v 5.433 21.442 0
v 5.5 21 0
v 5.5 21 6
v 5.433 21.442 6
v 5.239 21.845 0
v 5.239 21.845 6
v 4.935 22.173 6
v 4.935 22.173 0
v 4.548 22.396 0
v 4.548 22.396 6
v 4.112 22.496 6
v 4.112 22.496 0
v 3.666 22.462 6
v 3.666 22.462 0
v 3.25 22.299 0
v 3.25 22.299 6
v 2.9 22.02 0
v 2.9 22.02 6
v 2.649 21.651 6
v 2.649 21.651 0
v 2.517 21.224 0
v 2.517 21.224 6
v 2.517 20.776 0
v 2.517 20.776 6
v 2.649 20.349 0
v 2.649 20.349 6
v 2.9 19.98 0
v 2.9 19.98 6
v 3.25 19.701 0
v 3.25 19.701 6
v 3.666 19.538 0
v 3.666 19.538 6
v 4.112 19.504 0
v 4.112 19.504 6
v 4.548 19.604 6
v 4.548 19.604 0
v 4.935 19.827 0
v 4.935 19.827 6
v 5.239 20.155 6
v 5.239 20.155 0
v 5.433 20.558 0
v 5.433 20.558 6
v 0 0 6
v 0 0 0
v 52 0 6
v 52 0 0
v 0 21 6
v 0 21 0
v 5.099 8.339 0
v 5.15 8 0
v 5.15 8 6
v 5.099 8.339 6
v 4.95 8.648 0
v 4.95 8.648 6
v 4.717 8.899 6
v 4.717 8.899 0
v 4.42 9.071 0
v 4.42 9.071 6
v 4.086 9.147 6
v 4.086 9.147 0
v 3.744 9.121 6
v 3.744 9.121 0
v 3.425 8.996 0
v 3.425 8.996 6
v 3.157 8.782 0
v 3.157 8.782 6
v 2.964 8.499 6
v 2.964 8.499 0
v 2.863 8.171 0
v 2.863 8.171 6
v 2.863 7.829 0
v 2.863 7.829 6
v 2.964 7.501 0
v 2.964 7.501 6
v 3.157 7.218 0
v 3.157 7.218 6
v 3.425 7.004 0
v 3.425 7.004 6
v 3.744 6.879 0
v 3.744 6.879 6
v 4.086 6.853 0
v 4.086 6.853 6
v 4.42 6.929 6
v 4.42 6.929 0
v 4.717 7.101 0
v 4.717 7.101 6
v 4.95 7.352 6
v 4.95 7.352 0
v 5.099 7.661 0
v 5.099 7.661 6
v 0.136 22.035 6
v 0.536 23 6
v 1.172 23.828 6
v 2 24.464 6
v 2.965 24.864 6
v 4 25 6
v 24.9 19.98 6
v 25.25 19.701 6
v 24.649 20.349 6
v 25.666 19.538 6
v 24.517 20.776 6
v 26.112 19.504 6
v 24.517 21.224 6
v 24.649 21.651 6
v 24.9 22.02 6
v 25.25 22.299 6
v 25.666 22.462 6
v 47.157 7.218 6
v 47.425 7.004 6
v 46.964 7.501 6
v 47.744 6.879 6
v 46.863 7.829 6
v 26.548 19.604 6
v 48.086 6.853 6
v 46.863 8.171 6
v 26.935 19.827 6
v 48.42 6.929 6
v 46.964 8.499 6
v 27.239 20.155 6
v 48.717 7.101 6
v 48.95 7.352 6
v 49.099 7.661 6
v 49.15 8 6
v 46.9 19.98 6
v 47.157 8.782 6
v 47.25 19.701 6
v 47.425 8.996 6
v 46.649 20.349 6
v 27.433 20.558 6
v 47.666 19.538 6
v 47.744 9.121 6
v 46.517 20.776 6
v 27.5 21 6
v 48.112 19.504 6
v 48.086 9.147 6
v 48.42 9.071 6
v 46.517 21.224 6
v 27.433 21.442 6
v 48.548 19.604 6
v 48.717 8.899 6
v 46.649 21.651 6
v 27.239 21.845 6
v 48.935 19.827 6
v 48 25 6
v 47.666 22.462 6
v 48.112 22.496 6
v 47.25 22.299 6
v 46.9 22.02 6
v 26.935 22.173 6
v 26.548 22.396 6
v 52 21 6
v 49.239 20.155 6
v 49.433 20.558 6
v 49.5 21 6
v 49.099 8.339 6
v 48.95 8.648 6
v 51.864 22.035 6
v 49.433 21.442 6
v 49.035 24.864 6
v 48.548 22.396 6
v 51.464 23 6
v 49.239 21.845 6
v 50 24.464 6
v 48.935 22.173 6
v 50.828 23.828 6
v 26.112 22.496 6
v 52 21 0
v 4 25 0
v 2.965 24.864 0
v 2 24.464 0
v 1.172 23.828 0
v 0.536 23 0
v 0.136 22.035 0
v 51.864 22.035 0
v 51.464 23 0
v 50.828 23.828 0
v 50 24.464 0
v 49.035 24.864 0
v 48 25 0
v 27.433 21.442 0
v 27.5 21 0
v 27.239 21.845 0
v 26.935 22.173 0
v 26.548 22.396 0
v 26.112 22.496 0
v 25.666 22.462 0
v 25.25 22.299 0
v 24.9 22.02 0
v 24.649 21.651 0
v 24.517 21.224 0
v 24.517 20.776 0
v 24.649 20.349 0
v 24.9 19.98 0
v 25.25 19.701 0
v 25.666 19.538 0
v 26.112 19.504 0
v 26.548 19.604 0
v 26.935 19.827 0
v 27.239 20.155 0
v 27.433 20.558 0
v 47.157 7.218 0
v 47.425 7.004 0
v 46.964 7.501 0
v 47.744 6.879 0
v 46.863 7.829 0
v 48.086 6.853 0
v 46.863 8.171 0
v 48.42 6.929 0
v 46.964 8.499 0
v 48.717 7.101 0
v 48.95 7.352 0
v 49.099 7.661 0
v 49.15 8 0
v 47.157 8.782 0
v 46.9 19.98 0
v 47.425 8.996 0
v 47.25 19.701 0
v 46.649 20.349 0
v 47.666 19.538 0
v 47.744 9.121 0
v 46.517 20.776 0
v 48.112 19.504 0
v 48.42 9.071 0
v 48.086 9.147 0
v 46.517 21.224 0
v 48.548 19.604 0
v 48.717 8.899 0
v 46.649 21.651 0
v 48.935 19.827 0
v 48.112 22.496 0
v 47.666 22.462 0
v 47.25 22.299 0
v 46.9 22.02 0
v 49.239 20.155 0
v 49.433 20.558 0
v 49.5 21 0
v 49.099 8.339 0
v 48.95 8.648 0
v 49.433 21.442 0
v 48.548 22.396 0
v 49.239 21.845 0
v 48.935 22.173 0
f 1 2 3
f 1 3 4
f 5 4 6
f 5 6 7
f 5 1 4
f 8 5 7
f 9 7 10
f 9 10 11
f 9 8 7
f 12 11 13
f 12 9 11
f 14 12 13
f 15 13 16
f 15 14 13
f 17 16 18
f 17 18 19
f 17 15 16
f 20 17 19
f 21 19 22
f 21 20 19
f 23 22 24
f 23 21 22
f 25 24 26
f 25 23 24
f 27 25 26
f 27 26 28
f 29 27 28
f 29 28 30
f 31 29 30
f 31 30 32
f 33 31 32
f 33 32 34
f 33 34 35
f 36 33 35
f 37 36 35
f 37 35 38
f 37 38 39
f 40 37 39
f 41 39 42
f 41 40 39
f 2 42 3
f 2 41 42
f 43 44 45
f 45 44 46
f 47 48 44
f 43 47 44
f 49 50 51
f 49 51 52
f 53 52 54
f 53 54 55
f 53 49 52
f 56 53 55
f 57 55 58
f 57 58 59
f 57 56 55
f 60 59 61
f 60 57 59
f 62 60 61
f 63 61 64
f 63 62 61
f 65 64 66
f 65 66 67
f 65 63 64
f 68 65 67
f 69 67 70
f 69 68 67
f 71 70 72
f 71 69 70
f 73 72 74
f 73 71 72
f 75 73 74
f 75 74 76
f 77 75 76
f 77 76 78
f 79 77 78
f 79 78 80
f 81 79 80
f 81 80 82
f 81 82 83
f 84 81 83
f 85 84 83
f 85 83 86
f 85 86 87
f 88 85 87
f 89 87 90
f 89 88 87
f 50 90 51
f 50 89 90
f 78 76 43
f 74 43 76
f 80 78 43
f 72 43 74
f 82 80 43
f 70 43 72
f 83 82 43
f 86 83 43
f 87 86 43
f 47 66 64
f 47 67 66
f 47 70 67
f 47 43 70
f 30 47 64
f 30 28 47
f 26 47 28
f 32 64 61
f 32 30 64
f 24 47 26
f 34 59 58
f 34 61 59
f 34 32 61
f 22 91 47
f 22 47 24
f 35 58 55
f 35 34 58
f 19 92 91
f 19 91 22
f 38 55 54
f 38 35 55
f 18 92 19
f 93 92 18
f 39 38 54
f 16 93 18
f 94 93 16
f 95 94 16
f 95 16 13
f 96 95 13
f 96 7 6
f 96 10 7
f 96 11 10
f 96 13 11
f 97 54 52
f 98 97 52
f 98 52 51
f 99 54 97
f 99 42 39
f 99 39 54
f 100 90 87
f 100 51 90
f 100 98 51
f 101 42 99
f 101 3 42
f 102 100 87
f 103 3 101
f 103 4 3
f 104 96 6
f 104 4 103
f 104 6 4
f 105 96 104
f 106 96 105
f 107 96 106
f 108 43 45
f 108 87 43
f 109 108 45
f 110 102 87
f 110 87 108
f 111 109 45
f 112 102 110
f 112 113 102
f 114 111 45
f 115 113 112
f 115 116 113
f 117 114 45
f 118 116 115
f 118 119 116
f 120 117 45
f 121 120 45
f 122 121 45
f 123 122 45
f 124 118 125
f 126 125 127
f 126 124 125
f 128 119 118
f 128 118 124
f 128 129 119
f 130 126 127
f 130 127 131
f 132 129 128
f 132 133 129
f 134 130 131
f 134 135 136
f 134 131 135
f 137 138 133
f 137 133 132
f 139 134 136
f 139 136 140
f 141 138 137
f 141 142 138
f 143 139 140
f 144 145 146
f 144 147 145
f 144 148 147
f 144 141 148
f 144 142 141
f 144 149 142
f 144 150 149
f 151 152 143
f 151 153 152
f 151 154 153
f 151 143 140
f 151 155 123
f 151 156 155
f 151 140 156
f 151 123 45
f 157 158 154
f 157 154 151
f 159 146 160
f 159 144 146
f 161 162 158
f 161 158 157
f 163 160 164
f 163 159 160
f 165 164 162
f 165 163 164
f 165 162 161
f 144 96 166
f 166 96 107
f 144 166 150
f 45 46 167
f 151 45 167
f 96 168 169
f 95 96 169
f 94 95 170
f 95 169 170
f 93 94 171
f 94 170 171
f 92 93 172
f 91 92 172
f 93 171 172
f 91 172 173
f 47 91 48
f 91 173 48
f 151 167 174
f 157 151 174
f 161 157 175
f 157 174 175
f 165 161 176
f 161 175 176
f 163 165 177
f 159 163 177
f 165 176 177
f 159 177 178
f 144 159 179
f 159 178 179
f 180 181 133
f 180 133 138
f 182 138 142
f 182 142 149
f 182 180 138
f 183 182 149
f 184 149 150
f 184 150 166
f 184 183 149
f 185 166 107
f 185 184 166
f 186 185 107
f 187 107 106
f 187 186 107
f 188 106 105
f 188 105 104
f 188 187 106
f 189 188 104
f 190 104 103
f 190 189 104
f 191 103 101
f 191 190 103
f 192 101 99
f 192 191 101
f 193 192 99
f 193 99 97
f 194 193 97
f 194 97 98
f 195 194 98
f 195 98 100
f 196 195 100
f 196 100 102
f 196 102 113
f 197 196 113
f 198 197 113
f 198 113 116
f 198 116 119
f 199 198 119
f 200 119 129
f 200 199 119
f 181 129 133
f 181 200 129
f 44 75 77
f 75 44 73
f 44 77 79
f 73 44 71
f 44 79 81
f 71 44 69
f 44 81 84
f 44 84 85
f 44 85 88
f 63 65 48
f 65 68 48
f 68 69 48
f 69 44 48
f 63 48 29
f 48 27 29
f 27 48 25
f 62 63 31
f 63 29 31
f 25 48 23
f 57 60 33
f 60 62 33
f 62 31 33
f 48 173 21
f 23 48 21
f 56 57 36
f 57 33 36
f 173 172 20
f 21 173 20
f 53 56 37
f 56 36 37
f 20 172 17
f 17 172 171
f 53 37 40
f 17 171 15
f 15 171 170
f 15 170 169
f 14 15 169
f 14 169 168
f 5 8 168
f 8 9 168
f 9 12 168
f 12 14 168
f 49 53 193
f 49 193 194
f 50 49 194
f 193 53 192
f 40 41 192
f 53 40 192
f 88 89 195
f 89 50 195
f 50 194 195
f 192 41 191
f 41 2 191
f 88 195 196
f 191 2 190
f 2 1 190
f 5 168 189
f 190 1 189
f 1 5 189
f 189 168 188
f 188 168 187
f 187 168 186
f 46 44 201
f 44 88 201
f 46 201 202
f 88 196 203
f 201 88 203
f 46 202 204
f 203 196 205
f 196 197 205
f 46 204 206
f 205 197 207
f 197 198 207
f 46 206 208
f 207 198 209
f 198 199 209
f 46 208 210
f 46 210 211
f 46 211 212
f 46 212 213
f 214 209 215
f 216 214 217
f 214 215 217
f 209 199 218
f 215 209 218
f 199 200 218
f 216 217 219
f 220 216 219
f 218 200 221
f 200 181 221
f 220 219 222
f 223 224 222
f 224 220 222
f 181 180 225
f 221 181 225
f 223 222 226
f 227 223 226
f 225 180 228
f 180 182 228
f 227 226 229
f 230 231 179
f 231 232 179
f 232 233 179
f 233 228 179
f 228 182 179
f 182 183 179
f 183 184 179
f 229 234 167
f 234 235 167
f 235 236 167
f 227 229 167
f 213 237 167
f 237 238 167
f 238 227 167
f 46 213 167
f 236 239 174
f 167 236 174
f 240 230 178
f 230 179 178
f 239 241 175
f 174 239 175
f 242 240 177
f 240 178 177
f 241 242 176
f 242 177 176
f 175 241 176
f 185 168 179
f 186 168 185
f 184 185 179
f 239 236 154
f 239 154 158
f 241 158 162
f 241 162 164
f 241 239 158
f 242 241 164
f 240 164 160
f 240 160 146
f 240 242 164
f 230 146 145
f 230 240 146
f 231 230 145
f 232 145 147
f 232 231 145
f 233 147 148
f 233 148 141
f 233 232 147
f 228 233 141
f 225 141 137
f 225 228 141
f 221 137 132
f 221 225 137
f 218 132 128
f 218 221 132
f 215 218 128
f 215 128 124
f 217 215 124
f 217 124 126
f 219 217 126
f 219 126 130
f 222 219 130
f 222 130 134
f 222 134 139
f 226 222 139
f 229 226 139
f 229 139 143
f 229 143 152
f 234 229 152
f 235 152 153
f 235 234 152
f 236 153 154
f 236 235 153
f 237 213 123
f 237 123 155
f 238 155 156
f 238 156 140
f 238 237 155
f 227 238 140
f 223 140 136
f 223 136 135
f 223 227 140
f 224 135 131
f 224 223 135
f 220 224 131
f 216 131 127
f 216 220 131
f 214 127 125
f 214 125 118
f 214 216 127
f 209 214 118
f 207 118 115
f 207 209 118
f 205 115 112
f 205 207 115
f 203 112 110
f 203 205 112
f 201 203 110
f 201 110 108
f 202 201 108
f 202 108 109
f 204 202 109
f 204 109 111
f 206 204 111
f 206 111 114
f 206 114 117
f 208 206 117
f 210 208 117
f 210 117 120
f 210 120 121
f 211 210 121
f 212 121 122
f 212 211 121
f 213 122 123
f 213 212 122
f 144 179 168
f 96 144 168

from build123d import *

# Parameters (mm, degrees)
SKETCH1_R           = 1.5
SKETCH1_R_2         = 1.15
BOSS_EXTRUDE1_DEPTH = 6


with BuildPart() as part:
    # Sketch1 → Boss-Extrude1 (new body)
    with BuildSketch(Plane.XY):
        with BuildLine():
            Line((0, 0), (52, 0))
            Line((52, 0), (52, 21))
            ThreePointArc((52, 21), (50.828427125, 23.828427125), (48, 25))
            Line((48, 25), (4, 25))
            ThreePointArc((4, 25), (1.171572875, 23.828427125), (0, 21))
            Line((0, 21), (0, 0))
        make_face()
        with Locations((4, 21)):
            Circle(SKETCH1_R, mode=Mode.SUBTRACT)
        with Locations((48, 21)):
            Circle(SKETCH1_R, mode=Mode.SUBTRACT)
        with Locations((4, 8)):
            Circle(SKETCH1_R_2, mode=Mode.SUBTRACT)
        with Locations((48, 8)):
            Circle(SKETCH1_R_2, mode=Mode.SUBTRACT)
        with Locations((26, 21)):
            Circle(SKETCH1_R, mode=Mode.SUBTRACT)
    extrude(amount=BOSS_EXTRUDE1_DEPTH)


solid = part.part
